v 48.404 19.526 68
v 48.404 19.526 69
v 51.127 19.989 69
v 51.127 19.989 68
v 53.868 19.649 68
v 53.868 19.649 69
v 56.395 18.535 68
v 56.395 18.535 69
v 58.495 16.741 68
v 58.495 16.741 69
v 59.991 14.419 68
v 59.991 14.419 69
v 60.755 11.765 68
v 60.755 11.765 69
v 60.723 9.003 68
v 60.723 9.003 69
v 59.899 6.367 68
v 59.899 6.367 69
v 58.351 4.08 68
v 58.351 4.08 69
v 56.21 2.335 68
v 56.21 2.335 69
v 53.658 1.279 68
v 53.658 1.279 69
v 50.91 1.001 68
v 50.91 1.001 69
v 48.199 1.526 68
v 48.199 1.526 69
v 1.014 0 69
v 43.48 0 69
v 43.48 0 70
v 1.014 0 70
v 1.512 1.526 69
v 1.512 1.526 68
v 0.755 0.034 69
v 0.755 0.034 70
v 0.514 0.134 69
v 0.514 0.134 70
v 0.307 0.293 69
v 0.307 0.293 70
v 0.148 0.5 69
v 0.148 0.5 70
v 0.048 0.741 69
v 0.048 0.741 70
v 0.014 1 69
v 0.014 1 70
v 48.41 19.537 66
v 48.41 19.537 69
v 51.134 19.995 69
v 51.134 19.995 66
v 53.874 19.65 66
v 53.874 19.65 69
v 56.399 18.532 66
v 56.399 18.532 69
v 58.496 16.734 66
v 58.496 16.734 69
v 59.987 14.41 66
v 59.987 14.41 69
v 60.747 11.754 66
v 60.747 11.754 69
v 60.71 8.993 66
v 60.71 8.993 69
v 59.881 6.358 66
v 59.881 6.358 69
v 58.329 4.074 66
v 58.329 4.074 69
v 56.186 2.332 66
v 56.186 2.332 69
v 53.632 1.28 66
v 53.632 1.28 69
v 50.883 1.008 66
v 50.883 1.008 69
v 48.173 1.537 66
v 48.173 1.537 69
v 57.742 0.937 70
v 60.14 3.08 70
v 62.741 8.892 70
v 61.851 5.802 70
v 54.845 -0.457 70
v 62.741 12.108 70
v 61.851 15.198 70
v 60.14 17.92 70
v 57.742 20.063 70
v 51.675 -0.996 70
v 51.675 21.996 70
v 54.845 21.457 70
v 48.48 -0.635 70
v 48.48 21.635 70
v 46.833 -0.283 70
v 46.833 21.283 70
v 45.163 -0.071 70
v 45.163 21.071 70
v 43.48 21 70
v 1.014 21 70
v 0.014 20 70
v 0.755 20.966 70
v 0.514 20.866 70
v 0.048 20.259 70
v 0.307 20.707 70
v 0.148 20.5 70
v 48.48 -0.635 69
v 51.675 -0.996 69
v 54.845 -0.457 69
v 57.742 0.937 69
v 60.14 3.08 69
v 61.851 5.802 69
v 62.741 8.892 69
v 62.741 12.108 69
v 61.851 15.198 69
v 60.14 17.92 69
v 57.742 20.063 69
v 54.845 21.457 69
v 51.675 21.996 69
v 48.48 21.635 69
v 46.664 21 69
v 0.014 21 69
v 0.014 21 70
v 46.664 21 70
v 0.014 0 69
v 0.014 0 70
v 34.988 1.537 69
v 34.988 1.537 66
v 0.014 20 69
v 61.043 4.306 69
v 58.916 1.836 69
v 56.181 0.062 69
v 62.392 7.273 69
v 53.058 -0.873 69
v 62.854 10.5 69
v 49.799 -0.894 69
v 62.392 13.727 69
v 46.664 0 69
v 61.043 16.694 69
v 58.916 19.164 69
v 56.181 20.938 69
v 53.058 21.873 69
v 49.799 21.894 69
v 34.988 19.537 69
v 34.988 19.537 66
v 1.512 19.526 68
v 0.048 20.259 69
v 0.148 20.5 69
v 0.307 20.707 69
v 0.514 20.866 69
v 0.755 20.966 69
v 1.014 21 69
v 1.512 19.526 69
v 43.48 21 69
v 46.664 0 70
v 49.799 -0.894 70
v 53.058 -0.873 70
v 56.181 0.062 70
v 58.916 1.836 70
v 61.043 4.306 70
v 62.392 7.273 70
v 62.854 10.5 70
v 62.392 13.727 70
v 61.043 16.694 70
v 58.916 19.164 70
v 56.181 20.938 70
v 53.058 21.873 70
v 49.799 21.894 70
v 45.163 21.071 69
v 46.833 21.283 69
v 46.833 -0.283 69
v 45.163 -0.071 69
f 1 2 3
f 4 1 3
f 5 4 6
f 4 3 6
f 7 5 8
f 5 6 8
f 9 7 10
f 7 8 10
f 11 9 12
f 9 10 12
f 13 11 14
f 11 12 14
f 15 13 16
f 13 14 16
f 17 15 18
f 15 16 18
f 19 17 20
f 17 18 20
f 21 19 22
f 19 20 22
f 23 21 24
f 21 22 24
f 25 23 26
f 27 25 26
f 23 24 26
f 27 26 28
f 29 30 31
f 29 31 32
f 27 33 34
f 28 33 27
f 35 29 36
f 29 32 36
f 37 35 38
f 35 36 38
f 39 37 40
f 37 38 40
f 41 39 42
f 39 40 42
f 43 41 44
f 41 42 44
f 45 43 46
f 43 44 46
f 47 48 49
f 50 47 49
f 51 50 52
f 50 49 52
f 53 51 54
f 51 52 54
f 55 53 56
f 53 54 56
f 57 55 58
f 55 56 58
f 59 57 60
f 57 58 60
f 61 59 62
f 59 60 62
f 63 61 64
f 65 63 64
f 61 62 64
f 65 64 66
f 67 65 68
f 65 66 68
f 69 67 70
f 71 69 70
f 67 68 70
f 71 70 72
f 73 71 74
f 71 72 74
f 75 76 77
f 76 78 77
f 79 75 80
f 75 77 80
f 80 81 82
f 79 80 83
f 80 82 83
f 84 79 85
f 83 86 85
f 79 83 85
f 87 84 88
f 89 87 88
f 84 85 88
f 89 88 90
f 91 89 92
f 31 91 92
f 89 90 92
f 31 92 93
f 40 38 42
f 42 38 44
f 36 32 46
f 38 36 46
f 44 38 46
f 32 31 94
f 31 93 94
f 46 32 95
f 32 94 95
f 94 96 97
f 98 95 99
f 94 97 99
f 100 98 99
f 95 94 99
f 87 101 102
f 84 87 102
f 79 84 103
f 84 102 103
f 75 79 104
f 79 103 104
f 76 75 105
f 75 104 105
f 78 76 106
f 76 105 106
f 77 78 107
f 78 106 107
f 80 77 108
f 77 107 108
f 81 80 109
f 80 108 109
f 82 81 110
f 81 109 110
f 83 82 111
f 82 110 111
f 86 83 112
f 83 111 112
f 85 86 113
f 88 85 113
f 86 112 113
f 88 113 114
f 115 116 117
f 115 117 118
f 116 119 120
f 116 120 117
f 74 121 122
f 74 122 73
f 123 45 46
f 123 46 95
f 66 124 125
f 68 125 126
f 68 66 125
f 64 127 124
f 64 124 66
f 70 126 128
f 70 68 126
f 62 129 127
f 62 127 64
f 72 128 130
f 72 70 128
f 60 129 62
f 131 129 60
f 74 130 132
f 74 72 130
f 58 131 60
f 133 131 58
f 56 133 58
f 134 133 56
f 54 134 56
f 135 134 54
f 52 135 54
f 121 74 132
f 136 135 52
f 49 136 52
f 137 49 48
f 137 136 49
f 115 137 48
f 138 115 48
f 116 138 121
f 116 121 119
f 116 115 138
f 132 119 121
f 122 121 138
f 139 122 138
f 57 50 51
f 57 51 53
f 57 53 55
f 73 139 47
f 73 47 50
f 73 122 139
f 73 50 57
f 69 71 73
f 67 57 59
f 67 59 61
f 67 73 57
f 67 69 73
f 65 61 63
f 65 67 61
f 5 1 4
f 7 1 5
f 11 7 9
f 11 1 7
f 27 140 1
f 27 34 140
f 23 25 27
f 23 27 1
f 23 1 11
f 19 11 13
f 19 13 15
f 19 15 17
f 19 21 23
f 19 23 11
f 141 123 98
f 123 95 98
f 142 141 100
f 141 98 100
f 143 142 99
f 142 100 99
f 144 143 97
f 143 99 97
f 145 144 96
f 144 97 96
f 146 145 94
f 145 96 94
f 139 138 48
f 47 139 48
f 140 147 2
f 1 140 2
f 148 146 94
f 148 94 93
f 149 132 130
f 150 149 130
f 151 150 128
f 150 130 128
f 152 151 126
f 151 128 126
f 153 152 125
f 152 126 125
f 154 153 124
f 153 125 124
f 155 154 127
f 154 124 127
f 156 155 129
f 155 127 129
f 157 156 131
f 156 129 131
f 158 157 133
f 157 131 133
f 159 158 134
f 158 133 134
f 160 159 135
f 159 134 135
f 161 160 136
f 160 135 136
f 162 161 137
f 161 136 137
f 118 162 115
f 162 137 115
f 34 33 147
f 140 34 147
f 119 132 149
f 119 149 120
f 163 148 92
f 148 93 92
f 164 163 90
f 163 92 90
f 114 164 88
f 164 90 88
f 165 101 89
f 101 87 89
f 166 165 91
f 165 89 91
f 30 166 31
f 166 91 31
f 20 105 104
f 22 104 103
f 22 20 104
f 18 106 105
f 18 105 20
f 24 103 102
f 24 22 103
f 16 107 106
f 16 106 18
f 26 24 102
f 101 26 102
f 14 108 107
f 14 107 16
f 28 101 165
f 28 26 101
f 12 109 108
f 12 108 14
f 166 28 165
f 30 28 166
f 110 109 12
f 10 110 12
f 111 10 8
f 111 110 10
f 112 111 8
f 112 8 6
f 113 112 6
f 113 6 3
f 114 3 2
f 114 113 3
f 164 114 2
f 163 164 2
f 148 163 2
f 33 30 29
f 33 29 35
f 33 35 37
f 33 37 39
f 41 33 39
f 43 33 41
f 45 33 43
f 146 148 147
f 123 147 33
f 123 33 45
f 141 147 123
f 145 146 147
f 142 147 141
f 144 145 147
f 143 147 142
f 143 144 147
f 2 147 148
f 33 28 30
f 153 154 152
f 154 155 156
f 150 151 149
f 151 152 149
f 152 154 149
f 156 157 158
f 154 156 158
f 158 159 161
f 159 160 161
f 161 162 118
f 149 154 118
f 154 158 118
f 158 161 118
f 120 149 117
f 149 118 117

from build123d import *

# Parameters (mm, degrees)
PAD_DEPTH    = 1
PAD001_DEPTH = 1
FILLET_R     = 20
FILLET001_R  = 20
FILLET002_R  = 1
FILLET003_R  = 1
PAD002_DEPTH = 3


with BuildPart() as pad:
    # Sketch003 → Pad (new body)
    with BuildSketch(Plane.XY.offset(69)):
        with BuildLine():
            Line((0.013913, 21), (46.663841, 21))
            ThreePointArc((46.663841, 0), (62.854257, 10.5), (46.663841, 21))
            Line((46.663841, 0), (0.013913, 0))
            Line((0.013913, 0), (0.013913, 21))
        make_face()
    extrude(amount=PAD_DEPTH)


with BuildPart() as fillet003:
    # Pad001 base: copy of Pad
    add(pad.part)

    # Sketch → Pad001 (new body)
    with BuildSketch(Plane(origin=(0, 0, 69), x_dir=(1, 0, 0), z_dir=(0, 0, -1))):
        with BuildLine():
            Line((1.511721, -19.526379), (48.404155, -19.526379))
            ThreePointArc((48.404155, -19.526379), (60.840174, -10.38315), (48.198543, -1.526379))
            Line((1.511721, -1.526379), (48.198543, -1.526379))
            Line((1.511721, -1.526379), (1.511721, -19.526379))
        make_face()
    extrude(amount=PAD001_DEPTH)

    # Fillet
    fillet_edges = [fillet003.edges().sort_by_distance(p)[0] for p in [
        (46.663841, 21, 69.5),
    ]]
    fillet(fillet_edges, radius=FILLET_R)

    # Fillet001
    fillet001_edges = [fillet003.edges().sort_by_distance(p)[0] for p in [
        (46.663841, 0, 69.5),
    ]]
    fillet(fillet001_edges, radius=FILLET001_R)

    # Fillet002
    fillet002_edges = [fillet003.edges().sort_by_distance(p)[0] for p in [
        (0.013913, 0, 69.5),
    ]]
    fillet(fillet002_edges, radius=FILLET002_R)

    # Fillet003
    fillet003_edges = [fillet003.edges().sort_by_distance(p)[0] for p in [
        (0.013913, 21, 69.5),
    ]]
    fillet(fillet003_edges, radius=FILLET003_R)


with BuildPart() as pad002:
    # Pad002 base: copy of Pad
    add(pad.part)

    # Sketch004 → Pad002 (new body)
    with BuildSketch(Plane(origin=(0, 0, 69), x_dir=(1, 0, 0), z_dir=(0, 0, -1))):
        with BuildLine():
            Line((34.987533, -19.53733), (48.409999, -19.53733))
            ThreePointArc((48.409999, -19.53733), (60.829409, -10.372148), (48.172858, -1.53733))
            Line((34.987533, -1.53733), (48.172858, -1.53733))
            Line((34.987533, -1.53733), (34.987533, -19.53733))
        make_face()
    extrude(amount=PAD002_DEPTH)


solid = Compound([fillet003.part, pad002.part])
